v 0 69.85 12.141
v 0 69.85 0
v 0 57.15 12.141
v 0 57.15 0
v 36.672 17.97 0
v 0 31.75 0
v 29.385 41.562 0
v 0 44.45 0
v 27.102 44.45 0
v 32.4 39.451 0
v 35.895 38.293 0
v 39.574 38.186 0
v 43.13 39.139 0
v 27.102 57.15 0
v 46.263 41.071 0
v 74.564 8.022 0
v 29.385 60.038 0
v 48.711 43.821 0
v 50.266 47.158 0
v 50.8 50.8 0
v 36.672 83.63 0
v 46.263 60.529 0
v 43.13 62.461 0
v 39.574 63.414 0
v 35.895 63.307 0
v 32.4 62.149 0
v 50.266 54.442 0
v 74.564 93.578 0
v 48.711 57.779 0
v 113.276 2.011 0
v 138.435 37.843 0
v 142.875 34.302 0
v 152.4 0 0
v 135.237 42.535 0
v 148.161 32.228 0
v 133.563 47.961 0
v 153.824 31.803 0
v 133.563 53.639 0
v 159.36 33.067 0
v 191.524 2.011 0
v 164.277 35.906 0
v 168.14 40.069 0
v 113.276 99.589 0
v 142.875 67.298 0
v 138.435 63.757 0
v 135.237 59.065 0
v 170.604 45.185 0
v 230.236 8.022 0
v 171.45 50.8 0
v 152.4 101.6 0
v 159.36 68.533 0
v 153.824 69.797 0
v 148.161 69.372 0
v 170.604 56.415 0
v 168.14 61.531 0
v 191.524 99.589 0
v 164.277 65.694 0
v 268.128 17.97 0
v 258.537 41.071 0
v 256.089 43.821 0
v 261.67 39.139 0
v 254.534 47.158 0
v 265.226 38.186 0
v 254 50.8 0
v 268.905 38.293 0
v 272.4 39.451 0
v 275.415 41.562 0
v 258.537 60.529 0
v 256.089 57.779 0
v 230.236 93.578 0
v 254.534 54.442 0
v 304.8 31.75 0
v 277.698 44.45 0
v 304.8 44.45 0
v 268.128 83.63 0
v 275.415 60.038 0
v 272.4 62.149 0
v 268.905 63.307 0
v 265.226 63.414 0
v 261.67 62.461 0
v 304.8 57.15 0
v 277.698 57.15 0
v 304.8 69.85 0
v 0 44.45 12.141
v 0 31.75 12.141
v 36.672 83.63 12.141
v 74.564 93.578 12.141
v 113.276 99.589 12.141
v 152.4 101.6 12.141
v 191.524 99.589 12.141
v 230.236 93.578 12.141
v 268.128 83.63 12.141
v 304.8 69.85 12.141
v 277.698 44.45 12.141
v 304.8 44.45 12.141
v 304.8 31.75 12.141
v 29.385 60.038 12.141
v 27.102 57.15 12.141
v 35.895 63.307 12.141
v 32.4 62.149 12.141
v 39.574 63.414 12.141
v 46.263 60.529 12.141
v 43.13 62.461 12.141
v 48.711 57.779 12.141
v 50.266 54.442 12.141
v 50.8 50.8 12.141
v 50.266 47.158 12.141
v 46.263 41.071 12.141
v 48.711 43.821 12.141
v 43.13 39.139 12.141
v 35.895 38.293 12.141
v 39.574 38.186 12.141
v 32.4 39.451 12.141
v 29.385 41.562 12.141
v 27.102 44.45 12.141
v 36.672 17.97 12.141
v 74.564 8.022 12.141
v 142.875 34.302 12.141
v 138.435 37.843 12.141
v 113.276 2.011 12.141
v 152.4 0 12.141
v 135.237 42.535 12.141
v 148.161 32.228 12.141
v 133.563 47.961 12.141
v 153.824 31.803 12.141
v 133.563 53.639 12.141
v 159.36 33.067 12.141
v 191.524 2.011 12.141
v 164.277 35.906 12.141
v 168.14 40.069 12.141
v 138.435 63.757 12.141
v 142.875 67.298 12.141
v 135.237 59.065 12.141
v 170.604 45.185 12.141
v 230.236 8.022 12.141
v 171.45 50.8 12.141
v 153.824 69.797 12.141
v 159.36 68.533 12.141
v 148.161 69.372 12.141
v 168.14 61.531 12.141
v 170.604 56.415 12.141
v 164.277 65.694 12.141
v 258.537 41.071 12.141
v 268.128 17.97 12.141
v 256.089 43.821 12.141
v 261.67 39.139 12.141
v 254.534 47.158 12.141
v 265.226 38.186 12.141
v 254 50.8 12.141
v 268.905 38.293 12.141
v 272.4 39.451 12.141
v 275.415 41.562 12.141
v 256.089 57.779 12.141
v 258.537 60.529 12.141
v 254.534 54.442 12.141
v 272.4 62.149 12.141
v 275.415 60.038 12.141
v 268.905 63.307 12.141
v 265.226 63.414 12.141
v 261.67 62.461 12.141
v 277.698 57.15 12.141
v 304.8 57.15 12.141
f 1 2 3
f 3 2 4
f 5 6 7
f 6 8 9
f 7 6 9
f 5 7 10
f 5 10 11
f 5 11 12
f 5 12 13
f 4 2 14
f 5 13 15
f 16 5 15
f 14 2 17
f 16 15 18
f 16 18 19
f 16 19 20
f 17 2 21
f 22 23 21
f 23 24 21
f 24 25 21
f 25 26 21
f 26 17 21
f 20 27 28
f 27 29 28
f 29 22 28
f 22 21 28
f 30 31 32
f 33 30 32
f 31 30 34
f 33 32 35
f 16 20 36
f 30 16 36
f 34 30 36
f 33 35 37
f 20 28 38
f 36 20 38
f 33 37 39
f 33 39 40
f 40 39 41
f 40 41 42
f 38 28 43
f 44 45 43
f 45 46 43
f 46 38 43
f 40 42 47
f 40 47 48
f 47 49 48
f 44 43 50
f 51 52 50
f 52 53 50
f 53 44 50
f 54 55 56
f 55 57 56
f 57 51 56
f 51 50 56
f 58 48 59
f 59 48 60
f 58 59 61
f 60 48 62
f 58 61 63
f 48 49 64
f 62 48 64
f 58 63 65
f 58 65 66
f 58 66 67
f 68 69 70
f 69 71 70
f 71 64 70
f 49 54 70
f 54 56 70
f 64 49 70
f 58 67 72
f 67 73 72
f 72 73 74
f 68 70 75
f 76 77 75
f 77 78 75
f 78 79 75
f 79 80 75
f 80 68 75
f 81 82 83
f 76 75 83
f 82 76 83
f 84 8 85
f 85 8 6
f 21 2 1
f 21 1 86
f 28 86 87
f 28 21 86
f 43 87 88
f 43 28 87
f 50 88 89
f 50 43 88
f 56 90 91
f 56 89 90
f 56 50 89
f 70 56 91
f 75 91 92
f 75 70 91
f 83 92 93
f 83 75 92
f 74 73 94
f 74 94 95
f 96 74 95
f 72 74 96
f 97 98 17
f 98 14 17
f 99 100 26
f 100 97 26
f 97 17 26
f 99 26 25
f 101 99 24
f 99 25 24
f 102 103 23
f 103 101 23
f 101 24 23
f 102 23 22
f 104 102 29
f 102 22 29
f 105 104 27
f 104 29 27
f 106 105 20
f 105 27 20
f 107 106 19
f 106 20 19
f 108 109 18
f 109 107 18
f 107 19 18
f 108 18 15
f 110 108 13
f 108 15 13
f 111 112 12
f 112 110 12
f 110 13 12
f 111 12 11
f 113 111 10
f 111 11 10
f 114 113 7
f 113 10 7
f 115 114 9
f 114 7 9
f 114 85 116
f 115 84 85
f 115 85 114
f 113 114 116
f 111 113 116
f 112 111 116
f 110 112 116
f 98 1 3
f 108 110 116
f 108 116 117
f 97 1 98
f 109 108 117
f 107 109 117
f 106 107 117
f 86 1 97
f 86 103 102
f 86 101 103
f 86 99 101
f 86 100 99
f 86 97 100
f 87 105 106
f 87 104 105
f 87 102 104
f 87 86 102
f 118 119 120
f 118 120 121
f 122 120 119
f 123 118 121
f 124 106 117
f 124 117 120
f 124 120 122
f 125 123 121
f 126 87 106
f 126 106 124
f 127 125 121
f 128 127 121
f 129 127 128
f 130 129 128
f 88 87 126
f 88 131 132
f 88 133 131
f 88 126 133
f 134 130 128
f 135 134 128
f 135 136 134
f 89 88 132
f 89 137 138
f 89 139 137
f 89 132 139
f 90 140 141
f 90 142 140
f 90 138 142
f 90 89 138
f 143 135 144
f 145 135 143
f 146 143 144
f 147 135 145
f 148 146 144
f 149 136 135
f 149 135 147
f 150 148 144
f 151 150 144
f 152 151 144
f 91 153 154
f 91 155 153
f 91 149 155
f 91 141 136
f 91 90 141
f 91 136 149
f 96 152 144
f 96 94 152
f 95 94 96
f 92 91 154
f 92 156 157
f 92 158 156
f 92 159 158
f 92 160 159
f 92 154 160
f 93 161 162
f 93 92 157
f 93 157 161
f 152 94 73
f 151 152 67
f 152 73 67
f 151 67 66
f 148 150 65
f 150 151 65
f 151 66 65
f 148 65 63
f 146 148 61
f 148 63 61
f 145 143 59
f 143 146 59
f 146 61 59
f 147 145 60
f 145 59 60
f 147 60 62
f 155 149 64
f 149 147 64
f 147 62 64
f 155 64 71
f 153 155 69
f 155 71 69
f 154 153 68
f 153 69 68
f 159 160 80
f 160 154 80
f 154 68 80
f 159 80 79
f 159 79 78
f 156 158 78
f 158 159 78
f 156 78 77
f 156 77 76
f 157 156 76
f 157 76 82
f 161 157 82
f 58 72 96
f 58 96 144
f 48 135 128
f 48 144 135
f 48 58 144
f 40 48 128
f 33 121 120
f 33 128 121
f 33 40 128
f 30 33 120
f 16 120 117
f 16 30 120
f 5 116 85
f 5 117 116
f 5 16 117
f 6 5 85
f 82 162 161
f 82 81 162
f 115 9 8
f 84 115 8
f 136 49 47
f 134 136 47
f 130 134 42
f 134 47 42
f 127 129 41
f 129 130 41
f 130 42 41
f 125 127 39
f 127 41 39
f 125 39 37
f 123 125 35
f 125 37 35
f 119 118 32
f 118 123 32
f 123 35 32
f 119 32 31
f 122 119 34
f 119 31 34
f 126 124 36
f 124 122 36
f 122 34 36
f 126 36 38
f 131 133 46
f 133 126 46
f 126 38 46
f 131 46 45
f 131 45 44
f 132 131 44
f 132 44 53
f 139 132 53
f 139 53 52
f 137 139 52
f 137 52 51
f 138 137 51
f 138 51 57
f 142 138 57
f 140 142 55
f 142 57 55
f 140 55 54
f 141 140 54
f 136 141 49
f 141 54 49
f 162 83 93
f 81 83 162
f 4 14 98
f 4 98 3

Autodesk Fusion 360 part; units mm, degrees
sketch "Sketch1" plane through (0, 0, 0) normal (0, 0, 1) x (1, 0, 0)
  line L0 (0, 0) -> (304.8, 0) construction
  line L1 (304.8, 0) -> (304.8, 101.6) construction
  line L2 (304.8, 101.6) -> (0, 101.6) construction
  line L3 (0, 101.6) -> (0, 0) construction
  circle A0 centre (152.4, 50.8) radius 19.05
  line L4 (0, 50.8) -> (304.8, 50.8) construction
  line L5 (27.1015, 57.15) -> (0, 57.15)
  line L6 (27.1015, 44.45) -> (0, 44.45)
  line L7 (304.8, 57.15) -> (277.6985, 57.15)
  line L8 (277.6985, 44.45) -> (304.8, 44.45)
  line L9 (0, 69.85) -> (0, 57.15)
  line L10 (0, 44.45) -> (0, 31.75)
  line L11 (304.8, 69.85) -> (304.8, 57.15)
  line L12 (304.8, 44.45) -> (304.8, 31.75)
  arc A1 (27.1015, 44.45) -> (27.1015, 57.15) centre (38.1, 50.8) ccw
  arc A2 (277.6985, 57.15) -> (277.6985, 44.45) centre (266.7, 50.8) ccw
  arc A3 (304.8, 69.85) -> (0, 69.85) centre (152.4, -280.035) ccw
  line L13 (0, 44.45) -> (304.8, 44.45) construction
  line L14 (0, 57.15) -> (304.8, 57.15) construction
  arc A4 (0, 31.75) -> (304.8, 31.75) centre (152.4, 381.635) ccw
  dimension "d1" = 304.8
  dimension "d2" = 101.6
  dimension "d3" = 38.1
  dimension "d5" = 152.4
  dimension "d6" = 25.4
  dimension "d7" = 25.4
  dimension "d8" = 38.1
  dimension "d9" = 38.1
  dimension "d12" = 6.35
  dimension "d13" = 6.35
  dimension "d14" = 12.7
  dimension "d18" = 12.7
extrude "Extrude1" add sketch "Sketch1" along normal blind 12.1412
sketch "Sketch2" plane through (0, 0, 12.1412) normal (0, 0, 1) x (-1, 0, 0)
  circle A0 centre (-152.4, -50.8) radius 19.05
  line L0 (-277.6985, -57.15) -> (-304.8, -57.15)
  line L1 (-304.8, -57.15) -> (-304.8, -69.85)
  arc A1 (-304.8, -69.85) -> (0, -69.85) centre (-152.4, 280.035) ccw
  line L2 (0, -69.85) -> (0, -57.15)
  line L3 (0, -57.15) -> (-27.1015, -57.15)
  line L4 (-27.1015, -44.45) -> (0, -44.45)
  line L5 (0, -44.45) -> (0, -31.75)
  arc A2 (0, -31.75) -> (-304.8, -31.75) centre (-152.4, -381.635) ccw
  line L6 (-304.8, -31.75) -> (-304.8, -44.45)
  line L7 (-304.8, -44.45) -> (-277.6985, -44.45)
  line L8 (-89.0222, -74.9883) -> (-89.0222, -26.3401) construction
  line L9 (-89.0222, -26.3401) -> (-108.0722, -26.3401) construction
  line L10 (-108.0722, -26.3401) -> (-108.0722, -74.9883) construction
  line L11 (-108.0722, -74.9883) -> (-89.0222, -74.9883) construction
  line L12 (-152.4, -101.6) -> (-152.4, 0) construction
  arc A3 (-277.6985, -57.15) -> (-277.6985, -44.45) centre (-266.7, -50.8) ccw
  arc A4 (-27.1015, -44.45) -> (-27.1015, -57.15) centre (-38.1, -50.8) ccw
